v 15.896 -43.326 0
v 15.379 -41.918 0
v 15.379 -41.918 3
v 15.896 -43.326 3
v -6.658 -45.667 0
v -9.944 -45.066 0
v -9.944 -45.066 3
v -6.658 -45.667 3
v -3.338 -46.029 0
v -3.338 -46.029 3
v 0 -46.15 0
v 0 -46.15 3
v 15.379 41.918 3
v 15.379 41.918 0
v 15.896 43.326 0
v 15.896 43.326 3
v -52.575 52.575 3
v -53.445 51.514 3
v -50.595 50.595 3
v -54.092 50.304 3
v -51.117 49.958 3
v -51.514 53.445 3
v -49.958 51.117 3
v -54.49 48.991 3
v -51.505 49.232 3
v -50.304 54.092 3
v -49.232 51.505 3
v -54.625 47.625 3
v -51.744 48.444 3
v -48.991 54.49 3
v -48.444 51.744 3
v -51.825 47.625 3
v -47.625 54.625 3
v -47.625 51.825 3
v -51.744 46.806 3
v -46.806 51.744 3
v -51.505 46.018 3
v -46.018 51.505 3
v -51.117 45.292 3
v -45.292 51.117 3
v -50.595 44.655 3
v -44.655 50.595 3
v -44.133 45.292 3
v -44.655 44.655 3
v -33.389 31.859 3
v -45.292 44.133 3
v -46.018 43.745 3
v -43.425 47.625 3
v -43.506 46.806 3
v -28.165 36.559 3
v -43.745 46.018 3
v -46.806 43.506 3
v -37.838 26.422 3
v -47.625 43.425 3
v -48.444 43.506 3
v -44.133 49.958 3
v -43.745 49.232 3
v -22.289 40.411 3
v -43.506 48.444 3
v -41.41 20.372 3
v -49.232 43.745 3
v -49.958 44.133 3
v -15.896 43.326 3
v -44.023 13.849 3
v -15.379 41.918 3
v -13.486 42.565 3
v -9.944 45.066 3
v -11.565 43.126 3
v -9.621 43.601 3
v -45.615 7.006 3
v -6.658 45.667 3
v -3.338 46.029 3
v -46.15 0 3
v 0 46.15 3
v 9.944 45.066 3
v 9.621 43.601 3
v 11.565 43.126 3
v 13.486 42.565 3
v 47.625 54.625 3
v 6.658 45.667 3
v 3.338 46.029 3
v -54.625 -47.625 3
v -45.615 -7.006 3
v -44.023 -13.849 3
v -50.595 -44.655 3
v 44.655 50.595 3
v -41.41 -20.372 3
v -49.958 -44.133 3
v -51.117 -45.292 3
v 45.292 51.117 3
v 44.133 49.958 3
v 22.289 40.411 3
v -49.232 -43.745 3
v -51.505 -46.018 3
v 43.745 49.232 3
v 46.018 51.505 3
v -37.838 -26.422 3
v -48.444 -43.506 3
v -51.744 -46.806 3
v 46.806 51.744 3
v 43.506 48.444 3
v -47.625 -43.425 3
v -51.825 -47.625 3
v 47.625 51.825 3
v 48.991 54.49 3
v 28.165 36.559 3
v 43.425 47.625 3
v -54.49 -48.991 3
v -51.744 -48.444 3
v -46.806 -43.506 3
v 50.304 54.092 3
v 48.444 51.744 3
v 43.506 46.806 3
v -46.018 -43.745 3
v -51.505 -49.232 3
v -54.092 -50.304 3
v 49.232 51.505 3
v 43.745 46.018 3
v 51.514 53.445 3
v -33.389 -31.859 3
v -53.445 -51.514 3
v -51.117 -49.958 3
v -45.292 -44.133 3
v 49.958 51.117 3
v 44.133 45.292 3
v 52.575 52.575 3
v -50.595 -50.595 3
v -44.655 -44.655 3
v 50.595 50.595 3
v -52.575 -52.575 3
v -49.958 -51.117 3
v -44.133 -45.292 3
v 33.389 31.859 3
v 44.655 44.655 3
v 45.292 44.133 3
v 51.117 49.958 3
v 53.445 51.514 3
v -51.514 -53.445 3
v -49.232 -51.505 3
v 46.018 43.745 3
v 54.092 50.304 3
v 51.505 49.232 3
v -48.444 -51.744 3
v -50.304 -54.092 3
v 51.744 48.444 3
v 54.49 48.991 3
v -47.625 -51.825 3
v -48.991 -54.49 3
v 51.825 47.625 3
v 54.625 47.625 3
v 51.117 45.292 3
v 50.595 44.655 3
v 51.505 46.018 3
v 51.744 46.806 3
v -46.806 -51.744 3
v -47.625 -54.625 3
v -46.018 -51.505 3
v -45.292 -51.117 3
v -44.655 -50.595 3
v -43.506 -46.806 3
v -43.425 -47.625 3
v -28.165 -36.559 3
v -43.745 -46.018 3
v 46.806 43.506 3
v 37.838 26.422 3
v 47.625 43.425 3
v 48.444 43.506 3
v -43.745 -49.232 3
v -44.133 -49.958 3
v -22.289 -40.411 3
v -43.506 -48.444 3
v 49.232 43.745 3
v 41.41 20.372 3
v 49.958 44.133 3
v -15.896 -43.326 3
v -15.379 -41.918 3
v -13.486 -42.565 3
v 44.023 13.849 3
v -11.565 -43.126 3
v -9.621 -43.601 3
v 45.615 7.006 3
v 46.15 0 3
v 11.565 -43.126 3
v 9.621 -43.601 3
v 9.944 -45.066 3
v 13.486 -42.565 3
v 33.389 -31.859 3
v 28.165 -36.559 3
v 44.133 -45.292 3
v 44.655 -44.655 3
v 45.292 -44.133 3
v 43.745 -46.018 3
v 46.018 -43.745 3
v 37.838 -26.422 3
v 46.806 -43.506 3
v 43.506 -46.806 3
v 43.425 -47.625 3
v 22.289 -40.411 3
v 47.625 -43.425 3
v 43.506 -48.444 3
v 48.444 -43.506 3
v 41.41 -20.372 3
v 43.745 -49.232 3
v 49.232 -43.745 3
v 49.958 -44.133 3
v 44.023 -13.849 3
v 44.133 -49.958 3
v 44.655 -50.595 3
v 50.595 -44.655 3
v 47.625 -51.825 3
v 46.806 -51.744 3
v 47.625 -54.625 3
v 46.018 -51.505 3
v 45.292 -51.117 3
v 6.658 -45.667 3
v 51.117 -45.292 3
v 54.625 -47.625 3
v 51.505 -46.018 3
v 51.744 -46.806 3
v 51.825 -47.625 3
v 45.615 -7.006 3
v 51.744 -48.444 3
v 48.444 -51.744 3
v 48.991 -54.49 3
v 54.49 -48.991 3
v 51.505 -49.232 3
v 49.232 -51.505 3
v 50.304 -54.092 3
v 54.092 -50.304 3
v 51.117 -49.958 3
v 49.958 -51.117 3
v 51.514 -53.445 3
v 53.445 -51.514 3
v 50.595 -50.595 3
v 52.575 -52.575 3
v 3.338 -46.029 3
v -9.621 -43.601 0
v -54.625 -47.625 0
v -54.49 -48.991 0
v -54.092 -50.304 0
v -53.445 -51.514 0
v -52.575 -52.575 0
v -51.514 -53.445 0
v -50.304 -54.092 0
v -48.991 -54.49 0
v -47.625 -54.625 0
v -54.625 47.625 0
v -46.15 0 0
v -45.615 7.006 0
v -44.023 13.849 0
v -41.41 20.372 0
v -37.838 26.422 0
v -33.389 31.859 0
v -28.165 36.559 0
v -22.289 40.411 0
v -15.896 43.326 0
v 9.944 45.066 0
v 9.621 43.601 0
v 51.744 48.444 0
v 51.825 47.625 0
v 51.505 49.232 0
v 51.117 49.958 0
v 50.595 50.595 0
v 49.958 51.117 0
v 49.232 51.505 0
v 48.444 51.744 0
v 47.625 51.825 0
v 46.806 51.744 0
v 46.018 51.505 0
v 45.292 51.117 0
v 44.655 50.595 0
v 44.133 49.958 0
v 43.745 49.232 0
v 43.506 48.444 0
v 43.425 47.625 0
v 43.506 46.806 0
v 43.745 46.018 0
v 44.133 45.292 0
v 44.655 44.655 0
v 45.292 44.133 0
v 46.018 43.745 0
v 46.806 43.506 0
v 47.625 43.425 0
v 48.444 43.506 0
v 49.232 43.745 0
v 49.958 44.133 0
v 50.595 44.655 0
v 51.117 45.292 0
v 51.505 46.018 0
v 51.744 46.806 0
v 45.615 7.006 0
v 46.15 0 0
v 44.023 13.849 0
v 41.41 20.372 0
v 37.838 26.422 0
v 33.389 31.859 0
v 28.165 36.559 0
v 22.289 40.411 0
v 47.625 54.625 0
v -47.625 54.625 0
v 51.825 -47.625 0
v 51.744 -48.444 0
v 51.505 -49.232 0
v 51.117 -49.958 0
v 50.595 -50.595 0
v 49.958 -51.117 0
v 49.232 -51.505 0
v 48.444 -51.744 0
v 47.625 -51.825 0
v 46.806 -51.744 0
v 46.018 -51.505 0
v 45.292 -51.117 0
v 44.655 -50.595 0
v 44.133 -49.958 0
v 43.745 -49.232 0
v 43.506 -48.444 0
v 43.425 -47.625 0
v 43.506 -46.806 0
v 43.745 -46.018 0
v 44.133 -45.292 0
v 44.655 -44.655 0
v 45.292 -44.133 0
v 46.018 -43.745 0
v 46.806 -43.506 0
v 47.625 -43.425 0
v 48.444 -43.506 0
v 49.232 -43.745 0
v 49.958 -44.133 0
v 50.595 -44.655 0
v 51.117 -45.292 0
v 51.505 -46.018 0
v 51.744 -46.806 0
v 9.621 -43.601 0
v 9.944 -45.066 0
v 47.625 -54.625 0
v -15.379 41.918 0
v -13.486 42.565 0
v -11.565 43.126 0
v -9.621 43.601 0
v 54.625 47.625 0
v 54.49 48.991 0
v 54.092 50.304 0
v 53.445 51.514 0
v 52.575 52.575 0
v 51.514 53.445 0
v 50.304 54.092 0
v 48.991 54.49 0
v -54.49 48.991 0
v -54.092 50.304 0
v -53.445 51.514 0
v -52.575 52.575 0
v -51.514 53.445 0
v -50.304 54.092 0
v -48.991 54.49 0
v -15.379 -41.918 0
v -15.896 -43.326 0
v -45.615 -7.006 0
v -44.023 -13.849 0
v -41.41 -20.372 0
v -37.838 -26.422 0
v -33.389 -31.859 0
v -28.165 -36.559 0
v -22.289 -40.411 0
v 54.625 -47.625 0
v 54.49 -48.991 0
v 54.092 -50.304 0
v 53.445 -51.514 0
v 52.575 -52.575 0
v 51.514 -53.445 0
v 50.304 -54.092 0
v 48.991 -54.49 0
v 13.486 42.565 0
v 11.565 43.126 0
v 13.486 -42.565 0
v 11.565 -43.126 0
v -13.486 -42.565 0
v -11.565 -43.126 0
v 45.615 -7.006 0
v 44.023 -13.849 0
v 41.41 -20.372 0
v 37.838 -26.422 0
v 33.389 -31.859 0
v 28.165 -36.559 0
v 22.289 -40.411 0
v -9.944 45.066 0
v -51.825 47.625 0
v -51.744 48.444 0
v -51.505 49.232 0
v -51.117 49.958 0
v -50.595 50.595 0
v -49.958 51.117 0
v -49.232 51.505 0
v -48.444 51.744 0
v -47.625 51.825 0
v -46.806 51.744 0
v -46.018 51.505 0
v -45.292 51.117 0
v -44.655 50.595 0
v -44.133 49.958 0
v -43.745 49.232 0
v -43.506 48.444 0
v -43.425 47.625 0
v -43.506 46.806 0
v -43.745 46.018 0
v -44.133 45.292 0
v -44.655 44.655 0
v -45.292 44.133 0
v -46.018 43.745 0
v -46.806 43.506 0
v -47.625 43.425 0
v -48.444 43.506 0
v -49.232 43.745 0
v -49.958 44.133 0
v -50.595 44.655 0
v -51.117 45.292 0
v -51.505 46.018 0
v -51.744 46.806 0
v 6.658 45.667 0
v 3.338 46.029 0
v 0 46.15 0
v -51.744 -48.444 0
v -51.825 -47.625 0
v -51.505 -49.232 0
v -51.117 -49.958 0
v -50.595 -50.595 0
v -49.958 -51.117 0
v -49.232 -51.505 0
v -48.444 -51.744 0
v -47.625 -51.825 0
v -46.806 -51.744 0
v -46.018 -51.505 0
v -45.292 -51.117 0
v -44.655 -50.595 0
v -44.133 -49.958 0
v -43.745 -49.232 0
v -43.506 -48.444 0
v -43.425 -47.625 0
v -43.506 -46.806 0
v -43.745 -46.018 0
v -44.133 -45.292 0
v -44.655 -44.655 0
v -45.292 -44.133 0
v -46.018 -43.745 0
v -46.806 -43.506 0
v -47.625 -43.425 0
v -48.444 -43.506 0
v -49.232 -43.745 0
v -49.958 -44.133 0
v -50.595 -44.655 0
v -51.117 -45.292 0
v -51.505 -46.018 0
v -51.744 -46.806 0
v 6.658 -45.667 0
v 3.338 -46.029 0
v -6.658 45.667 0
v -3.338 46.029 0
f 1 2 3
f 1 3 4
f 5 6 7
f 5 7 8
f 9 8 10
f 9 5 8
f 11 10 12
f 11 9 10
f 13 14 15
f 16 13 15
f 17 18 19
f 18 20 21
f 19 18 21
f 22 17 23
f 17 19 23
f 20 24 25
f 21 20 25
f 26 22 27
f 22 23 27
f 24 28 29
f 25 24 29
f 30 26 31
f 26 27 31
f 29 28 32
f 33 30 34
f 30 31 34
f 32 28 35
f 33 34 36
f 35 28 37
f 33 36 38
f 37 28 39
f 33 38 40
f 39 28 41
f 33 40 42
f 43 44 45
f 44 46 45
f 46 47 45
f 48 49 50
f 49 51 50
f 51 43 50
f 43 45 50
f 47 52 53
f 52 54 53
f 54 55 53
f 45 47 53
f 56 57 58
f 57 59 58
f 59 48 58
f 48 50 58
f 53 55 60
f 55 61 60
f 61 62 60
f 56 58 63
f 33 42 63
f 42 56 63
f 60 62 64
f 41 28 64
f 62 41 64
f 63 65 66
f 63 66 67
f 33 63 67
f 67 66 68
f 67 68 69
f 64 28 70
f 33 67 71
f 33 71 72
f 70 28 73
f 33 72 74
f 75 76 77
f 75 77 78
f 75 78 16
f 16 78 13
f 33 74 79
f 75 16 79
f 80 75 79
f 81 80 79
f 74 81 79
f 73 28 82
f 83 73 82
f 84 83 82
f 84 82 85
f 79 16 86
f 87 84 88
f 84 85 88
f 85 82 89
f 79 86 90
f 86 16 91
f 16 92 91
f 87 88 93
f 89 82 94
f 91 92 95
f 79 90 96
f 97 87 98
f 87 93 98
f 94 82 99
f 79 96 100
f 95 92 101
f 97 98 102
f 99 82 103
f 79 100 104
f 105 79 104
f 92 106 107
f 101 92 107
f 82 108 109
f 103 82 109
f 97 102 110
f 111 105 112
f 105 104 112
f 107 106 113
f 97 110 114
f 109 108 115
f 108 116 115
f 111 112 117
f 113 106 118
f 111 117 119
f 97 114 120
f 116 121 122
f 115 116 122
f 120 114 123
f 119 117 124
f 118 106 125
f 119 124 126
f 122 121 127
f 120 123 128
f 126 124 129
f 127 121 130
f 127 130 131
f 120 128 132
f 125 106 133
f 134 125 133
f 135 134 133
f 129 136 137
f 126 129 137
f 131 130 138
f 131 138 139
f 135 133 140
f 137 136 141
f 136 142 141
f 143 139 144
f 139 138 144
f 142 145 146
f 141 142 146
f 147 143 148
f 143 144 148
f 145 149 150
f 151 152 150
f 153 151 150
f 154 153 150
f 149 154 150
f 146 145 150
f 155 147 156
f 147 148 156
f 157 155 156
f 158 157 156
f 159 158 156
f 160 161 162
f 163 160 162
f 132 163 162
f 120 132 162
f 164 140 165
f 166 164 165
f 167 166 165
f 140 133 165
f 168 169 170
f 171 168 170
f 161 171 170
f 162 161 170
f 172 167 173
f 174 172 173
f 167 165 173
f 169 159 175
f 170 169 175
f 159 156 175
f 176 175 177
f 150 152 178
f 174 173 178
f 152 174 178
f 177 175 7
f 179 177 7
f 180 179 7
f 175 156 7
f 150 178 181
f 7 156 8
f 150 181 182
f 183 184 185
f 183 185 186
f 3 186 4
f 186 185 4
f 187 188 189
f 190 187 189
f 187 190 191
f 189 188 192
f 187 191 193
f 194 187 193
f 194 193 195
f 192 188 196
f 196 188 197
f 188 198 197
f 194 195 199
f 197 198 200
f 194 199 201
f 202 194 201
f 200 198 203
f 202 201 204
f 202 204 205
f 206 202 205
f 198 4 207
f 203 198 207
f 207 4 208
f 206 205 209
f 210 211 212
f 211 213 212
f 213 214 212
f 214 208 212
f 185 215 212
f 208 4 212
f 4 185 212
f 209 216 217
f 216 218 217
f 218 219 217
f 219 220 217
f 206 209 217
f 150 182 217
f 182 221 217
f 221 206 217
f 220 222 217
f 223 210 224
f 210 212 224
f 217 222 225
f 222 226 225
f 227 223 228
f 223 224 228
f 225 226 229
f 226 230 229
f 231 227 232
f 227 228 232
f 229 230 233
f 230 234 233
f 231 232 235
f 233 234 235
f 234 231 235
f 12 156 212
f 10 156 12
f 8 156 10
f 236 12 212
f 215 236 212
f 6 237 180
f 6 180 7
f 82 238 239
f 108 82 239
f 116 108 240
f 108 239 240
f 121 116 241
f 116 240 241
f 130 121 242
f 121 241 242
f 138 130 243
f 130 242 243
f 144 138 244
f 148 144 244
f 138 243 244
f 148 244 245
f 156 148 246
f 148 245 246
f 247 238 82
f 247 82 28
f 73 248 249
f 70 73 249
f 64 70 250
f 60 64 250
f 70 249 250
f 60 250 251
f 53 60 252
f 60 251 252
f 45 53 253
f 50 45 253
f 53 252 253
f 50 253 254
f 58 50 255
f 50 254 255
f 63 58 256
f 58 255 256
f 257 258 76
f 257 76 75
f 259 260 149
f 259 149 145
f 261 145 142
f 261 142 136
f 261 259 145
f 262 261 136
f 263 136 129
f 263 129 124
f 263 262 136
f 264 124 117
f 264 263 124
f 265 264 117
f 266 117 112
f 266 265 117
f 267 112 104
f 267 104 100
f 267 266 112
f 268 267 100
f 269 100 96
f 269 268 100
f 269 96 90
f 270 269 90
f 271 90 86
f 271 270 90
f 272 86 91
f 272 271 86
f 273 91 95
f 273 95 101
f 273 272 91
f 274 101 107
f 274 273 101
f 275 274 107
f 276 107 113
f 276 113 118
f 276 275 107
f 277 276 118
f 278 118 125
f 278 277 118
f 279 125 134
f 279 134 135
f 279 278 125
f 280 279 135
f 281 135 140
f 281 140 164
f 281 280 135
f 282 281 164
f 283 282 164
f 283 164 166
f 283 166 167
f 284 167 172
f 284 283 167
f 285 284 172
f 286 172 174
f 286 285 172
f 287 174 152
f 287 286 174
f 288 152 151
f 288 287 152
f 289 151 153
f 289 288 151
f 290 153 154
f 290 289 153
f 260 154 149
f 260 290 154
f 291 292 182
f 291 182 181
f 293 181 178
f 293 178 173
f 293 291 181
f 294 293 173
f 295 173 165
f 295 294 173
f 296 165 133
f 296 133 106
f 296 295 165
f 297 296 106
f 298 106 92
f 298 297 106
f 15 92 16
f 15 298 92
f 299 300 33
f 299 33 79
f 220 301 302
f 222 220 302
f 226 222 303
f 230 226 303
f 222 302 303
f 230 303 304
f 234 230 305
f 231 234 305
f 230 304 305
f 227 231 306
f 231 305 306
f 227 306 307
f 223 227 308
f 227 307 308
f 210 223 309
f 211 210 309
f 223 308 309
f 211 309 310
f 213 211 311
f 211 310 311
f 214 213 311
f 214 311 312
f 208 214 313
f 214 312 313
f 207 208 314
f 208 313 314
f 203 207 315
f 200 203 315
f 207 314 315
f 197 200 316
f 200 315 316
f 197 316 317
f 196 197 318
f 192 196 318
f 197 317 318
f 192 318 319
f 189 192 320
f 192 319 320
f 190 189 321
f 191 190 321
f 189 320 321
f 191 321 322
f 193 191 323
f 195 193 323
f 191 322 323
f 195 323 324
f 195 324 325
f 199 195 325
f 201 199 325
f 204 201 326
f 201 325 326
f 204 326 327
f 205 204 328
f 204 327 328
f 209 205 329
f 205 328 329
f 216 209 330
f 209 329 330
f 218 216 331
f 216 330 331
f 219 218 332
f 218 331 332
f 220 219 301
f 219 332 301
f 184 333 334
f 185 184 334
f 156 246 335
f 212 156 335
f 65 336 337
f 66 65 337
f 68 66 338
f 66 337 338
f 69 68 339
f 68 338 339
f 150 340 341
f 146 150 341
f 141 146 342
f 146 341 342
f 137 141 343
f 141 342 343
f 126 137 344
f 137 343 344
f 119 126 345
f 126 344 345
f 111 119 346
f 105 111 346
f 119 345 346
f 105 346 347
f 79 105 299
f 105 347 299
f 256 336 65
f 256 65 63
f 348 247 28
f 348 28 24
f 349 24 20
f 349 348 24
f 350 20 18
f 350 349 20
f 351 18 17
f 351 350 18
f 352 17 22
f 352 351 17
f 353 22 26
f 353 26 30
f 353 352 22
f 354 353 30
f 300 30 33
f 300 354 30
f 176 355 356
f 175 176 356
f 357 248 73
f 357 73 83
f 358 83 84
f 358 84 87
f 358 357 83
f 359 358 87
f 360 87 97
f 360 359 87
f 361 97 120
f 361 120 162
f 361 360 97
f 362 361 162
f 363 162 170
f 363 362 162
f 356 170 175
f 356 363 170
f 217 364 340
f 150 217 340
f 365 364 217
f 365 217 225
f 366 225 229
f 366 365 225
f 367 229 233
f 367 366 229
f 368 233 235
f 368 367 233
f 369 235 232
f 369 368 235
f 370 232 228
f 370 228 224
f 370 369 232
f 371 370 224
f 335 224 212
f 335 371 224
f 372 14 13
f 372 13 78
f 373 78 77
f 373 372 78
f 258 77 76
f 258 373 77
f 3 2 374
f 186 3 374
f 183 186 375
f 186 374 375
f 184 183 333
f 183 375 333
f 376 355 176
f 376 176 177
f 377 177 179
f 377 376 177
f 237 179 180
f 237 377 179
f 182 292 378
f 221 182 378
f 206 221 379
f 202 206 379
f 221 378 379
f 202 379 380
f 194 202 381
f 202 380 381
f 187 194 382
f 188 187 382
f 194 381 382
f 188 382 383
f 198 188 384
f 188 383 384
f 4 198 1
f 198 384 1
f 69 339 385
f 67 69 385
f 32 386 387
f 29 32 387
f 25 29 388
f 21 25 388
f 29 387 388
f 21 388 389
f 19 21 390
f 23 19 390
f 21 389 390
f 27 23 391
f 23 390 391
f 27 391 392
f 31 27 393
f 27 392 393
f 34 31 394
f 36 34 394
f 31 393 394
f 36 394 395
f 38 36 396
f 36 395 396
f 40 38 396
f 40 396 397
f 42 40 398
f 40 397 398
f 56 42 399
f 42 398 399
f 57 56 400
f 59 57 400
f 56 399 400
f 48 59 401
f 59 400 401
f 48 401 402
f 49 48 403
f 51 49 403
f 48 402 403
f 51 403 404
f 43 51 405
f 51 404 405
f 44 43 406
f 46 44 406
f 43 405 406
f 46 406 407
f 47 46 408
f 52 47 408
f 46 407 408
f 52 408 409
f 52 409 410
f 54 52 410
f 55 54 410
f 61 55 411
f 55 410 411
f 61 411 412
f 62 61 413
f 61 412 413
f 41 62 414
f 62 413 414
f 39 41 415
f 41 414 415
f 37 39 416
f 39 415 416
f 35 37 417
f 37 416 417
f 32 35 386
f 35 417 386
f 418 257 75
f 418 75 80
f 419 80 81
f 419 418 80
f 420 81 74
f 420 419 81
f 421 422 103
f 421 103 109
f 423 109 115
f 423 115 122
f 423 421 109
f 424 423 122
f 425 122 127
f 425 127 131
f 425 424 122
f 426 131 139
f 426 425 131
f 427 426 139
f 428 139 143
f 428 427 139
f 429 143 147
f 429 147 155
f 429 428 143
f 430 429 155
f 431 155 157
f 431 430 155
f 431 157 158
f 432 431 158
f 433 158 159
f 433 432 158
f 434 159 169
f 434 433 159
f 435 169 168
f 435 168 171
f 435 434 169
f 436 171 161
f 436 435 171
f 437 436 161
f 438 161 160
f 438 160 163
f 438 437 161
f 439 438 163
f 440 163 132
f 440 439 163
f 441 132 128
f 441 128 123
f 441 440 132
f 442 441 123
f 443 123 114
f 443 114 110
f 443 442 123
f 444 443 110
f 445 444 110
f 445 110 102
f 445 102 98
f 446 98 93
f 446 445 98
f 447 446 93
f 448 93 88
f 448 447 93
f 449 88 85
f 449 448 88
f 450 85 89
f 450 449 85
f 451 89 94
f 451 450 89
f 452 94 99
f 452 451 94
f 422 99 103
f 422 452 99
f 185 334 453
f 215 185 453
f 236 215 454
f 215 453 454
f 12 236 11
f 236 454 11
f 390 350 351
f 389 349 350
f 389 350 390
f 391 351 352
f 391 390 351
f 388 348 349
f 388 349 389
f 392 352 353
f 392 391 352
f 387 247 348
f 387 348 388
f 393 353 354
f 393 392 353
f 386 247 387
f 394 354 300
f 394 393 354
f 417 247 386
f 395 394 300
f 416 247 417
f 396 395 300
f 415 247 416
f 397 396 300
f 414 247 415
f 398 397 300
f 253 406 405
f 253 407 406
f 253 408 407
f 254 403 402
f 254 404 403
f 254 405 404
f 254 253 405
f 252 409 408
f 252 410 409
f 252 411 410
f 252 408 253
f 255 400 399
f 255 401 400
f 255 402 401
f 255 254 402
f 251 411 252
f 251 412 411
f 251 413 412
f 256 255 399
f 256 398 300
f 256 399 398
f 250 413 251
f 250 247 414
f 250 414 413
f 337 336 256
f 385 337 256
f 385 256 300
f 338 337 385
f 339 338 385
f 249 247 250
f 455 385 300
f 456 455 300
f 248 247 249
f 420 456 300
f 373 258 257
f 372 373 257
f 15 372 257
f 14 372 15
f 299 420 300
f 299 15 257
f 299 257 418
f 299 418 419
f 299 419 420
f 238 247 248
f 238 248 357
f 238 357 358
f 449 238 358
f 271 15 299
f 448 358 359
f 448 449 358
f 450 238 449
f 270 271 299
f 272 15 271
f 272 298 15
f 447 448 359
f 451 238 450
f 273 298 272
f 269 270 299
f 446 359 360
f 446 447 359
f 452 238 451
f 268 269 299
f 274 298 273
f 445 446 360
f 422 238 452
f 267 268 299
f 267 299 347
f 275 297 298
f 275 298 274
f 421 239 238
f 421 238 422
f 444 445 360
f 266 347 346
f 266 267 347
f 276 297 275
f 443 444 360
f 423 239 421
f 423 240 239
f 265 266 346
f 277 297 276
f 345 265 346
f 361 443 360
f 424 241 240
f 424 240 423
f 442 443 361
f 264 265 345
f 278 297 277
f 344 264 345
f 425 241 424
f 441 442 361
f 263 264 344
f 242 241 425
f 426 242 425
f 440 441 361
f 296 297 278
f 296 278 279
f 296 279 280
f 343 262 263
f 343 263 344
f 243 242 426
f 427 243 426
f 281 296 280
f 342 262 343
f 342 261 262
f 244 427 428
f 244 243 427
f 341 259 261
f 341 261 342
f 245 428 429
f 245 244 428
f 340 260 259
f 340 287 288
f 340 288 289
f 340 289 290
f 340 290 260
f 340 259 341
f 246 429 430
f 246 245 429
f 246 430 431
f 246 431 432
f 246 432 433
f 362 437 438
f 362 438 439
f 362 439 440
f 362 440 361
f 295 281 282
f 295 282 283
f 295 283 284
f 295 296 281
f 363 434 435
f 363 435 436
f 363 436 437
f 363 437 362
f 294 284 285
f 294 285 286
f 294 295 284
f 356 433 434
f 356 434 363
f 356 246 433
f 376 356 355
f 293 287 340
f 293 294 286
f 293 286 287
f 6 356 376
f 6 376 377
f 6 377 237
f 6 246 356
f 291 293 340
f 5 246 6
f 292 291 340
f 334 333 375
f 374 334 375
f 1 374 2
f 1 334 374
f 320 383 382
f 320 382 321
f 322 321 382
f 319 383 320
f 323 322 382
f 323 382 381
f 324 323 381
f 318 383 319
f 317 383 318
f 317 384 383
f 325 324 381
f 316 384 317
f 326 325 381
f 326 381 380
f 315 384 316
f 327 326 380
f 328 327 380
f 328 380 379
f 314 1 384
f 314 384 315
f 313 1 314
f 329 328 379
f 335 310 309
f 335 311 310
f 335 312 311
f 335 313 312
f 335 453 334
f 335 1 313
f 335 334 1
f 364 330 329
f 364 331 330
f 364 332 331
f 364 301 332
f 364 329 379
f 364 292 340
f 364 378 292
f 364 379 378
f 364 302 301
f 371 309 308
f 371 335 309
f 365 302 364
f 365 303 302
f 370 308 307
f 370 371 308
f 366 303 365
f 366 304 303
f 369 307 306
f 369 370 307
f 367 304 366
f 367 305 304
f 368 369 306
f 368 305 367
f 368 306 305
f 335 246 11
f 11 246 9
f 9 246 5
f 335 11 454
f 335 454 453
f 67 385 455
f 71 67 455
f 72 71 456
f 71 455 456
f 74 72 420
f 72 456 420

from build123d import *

# Parameters (mm, degrees)
SKETCH004_R                = 4.2
PAD001_DEPTH               = 3
SKETCH004_MIRRORED003_2_R  = 4.2
PAD001_MIRRORED003_2_DEPTH = 3


with BuildPart() as part:
    # Sketch004 → Pad001 (new body)
    with BuildSketch(Plane.XY):
        with BuildLine():
            ThreePointArc((46.15, 0), (37.838009, 26.421725), (15.896152, 43.325914))
            Line((15.379484, 41.917705), (15.896152, 43.325914))
            ThreePointArc((15.379484, 41.917705), (12.528311, 42.856317), (9.620516, 43.60124))
            Line((9.620516, 43.60124), (9.943714, 45.066008))
            ThreePointArc((9.943714, 45.066008), (5.001312, 45.878202), (0, 46.15))
            Line((0, 46.15), (0, 54.625))
            Line((47.624993, 54.625), (0, 54.625))
            ThreePointArc((54.625, 47.625), (52.574745, 52.57475), (47.624993, 54.625))
            Line((54.625, 47.625), (54.625, 0))
            Line((46.15, 0), (54.625, 0))
        make_face()
        with Locations((47.625, 47.625)):
            Circle(SKETCH004_R, mode=Mode.SUBTRACT)
    pad001 = extrude(amount=PAD001_DEPTH)

    # Sketch004 Mirrored003 2 → Pad001 Mirrored003 2 (add)
    with BuildSketch(Plane(origin=(0, 0, 0), x_dir=(-1, 0, 0), z_dir=(0, 0, -1))):
        with BuildLine():
            ThreePointArc((46.15, 0), (37.838009, 26.421725), (15.896152, 43.325914))
            Line((15.379484, 41.917705), (15.896152, 43.325914))
            ThreePointArc((15.379484, 41.917705), (12.528311, 42.856317), (9.620516, 43.60124))
            Line((9.620516, 43.60124), (9.943714, 45.066008))
            ThreePointArc((9.943714, 45.066008), (5.001312, 45.878202), (0, 46.15))
            Line((0, 46.15), (0, 54.625))
            Line((47.624993, 54.625), (0, 54.625))
            ThreePointArc((54.625, 47.625), (52.574745, 52.57475), (47.624993, 54.625))
            Line((54.625, 47.625), (54.625, 0))
            Line((46.15, 0), (54.625, 0))
        make_face()
        with Locations((47.625, 47.625)):
            Circle(SKETCH004_MIRRORED003_2_R, mode=Mode.SUBTRACT)
    pad001_mirrored003_2 = extrude(amount=-PAD001_MIRRORED003_2_DEPTH)

    # Mirrored004: Pad001, Pad001 Mirrored003 2 across Sketch004 H_Axis
    add(pad001.mirror(Plane.ZX))
    add(pad001_mirrored003_2.mirror(Plane.ZX))


solid = part.part
